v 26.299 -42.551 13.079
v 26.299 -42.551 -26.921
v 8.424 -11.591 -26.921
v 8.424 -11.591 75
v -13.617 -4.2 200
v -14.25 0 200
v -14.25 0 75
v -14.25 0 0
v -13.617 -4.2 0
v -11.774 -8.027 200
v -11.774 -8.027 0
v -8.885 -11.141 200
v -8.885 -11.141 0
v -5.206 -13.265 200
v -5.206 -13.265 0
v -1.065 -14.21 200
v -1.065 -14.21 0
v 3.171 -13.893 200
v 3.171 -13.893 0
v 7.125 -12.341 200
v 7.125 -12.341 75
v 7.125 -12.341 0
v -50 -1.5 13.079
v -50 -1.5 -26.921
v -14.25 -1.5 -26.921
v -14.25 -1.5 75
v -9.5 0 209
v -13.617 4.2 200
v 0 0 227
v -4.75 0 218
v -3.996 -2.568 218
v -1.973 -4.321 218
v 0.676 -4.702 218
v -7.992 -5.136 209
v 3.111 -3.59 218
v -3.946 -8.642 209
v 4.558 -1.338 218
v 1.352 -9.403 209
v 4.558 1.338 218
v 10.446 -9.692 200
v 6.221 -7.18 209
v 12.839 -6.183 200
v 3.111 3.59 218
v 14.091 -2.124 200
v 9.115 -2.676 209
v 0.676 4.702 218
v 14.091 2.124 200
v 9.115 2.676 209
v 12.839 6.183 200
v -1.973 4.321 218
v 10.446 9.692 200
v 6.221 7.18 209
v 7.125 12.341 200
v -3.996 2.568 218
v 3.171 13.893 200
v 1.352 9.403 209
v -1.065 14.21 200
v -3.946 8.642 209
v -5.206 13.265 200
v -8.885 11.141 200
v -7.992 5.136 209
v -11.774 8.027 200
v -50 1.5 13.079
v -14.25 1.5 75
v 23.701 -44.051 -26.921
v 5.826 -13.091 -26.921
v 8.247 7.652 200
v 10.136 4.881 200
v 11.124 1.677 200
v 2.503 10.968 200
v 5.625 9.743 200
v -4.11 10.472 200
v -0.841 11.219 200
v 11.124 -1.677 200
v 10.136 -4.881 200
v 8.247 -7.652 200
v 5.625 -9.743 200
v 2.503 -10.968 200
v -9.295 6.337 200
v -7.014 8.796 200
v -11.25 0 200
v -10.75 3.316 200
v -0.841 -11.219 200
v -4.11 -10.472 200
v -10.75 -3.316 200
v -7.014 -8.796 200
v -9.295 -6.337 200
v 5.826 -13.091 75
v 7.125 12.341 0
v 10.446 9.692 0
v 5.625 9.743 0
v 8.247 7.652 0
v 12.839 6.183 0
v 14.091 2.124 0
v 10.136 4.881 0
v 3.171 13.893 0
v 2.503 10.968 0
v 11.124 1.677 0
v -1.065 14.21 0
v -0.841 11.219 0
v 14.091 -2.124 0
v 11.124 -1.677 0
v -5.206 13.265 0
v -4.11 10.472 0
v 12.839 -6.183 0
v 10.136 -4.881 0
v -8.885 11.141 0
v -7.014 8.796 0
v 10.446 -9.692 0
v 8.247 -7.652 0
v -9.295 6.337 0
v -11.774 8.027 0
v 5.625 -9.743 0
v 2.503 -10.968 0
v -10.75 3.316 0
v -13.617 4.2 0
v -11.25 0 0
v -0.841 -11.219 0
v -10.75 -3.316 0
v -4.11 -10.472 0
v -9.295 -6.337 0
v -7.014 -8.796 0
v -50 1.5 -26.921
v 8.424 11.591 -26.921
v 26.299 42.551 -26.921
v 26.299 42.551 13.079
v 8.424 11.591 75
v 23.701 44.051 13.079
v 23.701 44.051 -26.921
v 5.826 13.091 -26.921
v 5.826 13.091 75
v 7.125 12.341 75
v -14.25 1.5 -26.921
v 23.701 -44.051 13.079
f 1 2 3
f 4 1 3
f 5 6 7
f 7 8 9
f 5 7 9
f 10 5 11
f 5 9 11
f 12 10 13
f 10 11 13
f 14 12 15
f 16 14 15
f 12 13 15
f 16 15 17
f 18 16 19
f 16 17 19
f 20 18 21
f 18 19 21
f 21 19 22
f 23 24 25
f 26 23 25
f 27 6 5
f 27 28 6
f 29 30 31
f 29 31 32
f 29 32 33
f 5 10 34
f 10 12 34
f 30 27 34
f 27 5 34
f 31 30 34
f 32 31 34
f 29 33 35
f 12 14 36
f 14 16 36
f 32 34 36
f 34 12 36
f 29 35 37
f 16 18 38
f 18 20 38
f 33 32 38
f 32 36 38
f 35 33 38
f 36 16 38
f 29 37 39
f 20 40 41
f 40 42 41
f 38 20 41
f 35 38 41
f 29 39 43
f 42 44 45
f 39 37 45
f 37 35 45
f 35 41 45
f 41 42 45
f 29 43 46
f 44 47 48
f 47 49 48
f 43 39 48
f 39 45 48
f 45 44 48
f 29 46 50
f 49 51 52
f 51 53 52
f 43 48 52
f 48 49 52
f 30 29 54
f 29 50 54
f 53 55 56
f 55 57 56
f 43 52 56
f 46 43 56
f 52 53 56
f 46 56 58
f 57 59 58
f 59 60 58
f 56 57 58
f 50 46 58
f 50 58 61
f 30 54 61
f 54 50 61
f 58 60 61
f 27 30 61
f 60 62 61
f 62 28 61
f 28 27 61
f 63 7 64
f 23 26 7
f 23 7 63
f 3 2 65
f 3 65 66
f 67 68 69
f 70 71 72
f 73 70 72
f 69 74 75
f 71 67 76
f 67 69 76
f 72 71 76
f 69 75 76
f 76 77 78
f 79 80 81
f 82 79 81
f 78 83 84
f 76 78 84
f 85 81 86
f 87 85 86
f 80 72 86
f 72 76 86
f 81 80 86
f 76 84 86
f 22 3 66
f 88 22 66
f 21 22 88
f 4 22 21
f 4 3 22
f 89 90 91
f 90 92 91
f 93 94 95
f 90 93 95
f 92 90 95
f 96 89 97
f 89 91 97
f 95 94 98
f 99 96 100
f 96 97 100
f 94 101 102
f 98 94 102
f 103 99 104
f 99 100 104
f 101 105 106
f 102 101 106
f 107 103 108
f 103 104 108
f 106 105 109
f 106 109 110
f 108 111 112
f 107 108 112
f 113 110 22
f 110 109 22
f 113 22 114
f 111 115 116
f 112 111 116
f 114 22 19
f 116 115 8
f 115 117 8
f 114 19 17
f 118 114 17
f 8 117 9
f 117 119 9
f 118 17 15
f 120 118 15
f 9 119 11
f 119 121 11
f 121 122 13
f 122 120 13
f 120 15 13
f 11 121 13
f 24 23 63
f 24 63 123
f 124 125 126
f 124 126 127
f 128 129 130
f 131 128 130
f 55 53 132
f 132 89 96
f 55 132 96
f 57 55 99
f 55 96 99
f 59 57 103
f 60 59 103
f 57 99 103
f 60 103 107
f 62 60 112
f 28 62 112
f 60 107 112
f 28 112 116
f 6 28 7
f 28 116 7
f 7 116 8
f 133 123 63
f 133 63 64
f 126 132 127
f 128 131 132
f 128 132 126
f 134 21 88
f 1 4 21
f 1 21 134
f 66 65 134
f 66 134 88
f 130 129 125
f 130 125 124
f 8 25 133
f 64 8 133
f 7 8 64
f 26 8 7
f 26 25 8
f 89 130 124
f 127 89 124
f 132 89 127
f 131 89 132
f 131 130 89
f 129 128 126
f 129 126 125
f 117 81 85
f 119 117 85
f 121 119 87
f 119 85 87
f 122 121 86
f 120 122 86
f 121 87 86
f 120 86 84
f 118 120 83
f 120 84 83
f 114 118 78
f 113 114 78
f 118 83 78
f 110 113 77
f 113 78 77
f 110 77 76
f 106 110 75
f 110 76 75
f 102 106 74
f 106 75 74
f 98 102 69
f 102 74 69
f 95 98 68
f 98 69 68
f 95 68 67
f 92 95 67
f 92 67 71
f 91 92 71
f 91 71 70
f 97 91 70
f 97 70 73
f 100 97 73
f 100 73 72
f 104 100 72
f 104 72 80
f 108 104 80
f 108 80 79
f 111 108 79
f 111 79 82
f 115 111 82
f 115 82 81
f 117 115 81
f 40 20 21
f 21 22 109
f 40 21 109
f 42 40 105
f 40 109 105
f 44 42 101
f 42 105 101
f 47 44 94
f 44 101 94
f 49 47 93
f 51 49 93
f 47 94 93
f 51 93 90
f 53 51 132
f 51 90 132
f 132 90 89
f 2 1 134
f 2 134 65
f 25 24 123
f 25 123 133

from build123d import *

# Parameters (mm, degrees)
F3_DEPTH = 1.5
F4_COUNT = 3


with BuildPart() as f1:
    # F0 (on Front) → F1 (revolve)
    with BuildSketch(Plane.XZ):
        Polygon((0, 200), (0, 227), (-14.25, 200), (-14.25, 0), (-11.25, 0), (-11.25, 200), align=None)
    revolve(axis=Axis((0, 0, 113.5), (0, 0, 1)))

    # F2 (on Front) → F3 (join, symmetric)
    with BuildSketch(Plane.XZ):
        Polygon((-14.25, 75), (-50, 13.0791836294), (-50, -26.9208163706), (-14.25, -26.9208163706), (-14.25, -16.9208163706), (-14.25, 0), align=None)
    extrude(amount=F3_DEPTH, both=True)

    # F4: F1 ×3 about axis
    f4_axis = Axis((0, 0, 200), (0, 0, -1))


with BuildPart() as f1_1:
    add(f1.part)
    for i in range(1, F4_COUNT):
        add(f1.part.rotate(f4_axis, i * 360 / F4_COUNT))


solid = f1_1.part
